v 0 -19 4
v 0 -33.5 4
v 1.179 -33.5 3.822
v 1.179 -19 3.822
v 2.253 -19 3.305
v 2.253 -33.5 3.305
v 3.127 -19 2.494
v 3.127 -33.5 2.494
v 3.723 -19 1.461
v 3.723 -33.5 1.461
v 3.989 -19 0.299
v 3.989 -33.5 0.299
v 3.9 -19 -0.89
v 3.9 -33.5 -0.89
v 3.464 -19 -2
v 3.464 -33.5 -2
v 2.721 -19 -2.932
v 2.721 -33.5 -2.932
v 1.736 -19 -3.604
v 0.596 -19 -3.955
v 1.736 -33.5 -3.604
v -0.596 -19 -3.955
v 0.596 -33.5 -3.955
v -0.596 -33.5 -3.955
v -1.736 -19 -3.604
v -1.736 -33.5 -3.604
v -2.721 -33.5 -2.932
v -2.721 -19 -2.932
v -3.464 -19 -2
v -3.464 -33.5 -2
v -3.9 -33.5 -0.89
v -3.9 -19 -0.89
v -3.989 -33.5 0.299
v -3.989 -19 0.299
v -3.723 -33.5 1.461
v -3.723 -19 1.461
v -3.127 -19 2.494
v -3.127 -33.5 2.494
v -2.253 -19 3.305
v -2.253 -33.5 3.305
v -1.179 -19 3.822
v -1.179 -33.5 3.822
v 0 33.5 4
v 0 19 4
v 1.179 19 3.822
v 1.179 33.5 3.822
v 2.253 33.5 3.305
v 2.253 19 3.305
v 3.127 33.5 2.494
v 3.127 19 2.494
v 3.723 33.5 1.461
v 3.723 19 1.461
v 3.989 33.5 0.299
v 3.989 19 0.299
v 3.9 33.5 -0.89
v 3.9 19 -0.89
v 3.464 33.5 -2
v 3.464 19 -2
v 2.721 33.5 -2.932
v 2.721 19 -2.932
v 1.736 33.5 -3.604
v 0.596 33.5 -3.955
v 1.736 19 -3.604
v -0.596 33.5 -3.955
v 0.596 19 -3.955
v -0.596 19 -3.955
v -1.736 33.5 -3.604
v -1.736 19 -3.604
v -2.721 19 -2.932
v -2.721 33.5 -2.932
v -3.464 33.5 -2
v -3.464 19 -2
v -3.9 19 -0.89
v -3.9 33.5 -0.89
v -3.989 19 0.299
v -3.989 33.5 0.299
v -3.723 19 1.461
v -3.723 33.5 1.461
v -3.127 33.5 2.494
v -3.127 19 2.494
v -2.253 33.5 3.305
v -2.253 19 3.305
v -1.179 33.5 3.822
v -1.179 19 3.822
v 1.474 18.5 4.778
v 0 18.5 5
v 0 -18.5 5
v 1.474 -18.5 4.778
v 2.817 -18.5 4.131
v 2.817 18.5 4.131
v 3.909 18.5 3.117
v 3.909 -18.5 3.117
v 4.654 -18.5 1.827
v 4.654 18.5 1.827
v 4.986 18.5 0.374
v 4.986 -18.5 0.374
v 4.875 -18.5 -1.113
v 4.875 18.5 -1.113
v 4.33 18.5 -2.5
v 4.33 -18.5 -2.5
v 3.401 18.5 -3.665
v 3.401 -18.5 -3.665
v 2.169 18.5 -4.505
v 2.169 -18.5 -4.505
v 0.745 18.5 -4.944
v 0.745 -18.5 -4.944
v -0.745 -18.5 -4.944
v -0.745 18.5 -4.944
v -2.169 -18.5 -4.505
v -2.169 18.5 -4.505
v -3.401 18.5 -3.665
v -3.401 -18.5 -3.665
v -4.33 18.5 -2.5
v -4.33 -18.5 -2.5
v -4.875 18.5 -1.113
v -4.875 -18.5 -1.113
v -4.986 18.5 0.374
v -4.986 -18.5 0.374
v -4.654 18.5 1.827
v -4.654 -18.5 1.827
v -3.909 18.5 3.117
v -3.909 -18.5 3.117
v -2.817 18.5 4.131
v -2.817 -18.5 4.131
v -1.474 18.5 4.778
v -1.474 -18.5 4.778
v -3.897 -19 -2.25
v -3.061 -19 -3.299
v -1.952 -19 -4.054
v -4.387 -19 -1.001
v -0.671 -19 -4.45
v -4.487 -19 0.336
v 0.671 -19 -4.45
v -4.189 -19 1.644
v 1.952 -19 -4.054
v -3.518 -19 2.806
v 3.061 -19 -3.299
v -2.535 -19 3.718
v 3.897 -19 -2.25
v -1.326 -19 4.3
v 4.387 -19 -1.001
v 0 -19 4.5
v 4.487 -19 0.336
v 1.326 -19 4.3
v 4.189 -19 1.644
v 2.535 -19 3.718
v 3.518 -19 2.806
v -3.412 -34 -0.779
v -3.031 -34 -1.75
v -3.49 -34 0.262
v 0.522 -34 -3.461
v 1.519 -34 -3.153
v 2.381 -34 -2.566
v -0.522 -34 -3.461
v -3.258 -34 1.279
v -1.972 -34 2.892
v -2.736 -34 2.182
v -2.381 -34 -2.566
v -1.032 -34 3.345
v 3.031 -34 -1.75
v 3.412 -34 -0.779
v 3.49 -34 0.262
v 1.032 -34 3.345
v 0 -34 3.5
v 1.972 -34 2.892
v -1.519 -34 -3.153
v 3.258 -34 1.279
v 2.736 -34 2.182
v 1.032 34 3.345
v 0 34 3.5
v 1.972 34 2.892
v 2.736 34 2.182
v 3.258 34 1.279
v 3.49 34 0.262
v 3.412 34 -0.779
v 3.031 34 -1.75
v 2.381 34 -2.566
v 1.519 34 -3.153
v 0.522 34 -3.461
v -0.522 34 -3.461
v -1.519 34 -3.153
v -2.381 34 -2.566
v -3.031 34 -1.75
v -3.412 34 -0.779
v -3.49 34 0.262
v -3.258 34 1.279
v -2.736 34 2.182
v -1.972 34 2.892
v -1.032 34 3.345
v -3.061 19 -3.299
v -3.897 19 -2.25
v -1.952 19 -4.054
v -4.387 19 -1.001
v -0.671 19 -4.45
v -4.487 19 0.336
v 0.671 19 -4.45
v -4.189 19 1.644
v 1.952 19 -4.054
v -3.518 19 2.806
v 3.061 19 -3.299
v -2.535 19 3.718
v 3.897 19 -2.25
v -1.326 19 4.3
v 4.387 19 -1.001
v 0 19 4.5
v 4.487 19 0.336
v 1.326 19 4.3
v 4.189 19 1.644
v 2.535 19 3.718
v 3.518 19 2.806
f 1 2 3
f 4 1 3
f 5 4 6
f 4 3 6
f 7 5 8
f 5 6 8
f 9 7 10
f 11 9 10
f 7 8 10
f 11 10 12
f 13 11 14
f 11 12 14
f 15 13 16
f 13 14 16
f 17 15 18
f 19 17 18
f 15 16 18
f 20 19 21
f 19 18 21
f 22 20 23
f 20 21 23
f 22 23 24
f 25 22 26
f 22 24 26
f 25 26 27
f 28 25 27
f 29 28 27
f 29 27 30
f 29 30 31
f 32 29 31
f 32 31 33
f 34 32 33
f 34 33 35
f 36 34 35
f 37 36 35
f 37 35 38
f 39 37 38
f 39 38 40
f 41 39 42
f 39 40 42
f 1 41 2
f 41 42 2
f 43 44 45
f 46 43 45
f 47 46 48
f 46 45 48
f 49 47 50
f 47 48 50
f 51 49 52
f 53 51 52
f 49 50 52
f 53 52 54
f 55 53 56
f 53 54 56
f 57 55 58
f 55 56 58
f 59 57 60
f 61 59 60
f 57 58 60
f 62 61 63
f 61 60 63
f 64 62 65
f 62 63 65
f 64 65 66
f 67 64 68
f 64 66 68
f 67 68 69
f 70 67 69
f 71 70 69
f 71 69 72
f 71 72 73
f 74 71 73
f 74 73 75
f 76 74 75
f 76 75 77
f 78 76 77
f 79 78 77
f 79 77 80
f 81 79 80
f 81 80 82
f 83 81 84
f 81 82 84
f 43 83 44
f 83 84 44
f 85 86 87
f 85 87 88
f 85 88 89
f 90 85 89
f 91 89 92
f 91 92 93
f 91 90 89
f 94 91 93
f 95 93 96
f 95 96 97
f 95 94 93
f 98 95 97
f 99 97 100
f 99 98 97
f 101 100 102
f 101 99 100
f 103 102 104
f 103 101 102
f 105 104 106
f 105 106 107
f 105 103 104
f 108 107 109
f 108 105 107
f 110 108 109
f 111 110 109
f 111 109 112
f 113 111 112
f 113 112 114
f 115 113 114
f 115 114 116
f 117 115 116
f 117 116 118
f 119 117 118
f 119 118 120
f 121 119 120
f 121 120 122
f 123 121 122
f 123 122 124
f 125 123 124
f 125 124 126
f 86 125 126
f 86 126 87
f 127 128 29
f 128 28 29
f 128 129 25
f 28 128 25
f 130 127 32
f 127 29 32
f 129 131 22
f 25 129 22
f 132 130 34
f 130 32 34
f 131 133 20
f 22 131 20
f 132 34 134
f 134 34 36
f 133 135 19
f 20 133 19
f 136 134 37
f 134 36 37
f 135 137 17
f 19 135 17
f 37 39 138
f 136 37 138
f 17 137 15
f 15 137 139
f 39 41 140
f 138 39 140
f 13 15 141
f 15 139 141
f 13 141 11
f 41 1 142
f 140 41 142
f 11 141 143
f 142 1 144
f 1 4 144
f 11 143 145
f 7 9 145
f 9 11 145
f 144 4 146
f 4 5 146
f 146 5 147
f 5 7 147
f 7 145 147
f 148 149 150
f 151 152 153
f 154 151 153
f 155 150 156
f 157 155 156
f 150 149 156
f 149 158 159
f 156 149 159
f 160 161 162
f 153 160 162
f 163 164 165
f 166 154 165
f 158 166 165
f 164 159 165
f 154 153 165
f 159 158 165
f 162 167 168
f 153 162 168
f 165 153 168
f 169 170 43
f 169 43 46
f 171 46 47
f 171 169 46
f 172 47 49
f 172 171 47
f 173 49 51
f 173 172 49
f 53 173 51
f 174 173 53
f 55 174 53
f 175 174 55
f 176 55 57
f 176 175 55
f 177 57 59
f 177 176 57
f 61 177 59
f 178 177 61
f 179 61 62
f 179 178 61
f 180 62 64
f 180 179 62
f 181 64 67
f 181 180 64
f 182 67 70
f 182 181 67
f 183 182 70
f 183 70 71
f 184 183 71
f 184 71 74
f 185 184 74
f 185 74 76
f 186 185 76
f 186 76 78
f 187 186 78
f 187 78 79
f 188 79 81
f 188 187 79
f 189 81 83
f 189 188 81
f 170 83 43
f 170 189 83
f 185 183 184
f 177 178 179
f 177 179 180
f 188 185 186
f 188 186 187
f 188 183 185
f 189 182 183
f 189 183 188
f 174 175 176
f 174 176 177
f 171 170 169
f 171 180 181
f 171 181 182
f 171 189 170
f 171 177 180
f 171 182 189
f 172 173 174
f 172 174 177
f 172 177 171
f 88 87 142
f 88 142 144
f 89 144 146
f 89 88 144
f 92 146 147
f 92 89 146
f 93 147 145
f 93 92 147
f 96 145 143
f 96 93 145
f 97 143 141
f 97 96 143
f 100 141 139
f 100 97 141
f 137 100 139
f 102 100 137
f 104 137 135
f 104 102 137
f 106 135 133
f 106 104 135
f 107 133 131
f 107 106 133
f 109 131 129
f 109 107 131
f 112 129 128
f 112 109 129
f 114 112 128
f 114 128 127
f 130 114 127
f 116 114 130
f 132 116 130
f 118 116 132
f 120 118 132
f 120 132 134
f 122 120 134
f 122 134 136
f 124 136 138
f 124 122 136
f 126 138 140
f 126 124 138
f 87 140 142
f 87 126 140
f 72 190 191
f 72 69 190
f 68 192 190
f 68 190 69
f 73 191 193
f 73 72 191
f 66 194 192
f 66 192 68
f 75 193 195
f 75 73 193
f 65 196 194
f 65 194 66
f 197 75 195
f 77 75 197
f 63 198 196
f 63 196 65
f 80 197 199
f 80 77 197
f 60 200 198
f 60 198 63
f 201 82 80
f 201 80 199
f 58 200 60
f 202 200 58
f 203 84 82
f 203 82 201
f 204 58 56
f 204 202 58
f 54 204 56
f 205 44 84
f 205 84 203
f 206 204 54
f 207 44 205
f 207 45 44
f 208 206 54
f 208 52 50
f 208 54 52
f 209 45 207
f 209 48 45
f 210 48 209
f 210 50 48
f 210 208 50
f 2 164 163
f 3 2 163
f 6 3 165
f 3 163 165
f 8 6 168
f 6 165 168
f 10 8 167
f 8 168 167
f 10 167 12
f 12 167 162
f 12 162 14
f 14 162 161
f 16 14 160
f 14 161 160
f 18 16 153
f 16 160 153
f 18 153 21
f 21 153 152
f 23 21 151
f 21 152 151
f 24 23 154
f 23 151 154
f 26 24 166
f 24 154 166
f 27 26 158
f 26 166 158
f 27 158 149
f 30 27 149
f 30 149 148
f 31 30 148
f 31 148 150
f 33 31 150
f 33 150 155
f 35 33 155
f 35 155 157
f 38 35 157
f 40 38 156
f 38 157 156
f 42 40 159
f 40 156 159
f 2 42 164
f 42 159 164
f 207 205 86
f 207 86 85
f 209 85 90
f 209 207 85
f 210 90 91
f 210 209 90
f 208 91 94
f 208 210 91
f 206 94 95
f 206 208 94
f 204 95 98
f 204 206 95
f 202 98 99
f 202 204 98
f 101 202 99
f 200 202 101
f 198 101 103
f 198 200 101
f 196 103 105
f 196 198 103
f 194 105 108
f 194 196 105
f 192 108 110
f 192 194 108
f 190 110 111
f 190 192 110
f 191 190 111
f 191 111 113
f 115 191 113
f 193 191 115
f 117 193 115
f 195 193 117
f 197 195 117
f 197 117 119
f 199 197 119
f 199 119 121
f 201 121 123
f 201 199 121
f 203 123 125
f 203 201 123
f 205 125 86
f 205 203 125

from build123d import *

# Parameters (mm, degrees)
SKETCH1_R           = 5
BOSS_EXTRUDE1_DEPTH = 19
SKETCH2_R           = 4
BOSS_EXTRUDE2_DEPTH = 15
BOSS_EXTRUDE3_START = -53
SKETCH2_2_R         = 4
BOSS_EXTRUDE3_DEPTH = 15
CHAMFER1_SIZE       = 0.5
CHAMFER2_SIZE       = 0.5


with BuildPart() as part:
    # Sketch1 → Boss-Extrude1 (new, symmetric)
    with BuildSketch(Plane(origin=(0, 0, 0), x_dir=(1, 0, 0), z_dir=(0, 1, 0))):
        with Locations(Location((0, 0, 0), (0, 0, 270))):
            Circle(SKETCH1_R)
    extrude(amount=BOSS_EXTRUDE1_DEPTH, both=True)

    # Sketch2 → Boss-Extrude2 (add)
    with BuildSketch(Plane(origin=(0, 19, 0), x_dir=(1, 0, 0), z_dir=(0, 1, 0))):
        with Locations(Location((0, 0, 0), (0, 0, 270))):
            Circle(SKETCH2_R)
    extrude(amount=BOSS_EXTRUDE2_DEPTH)

    # Sketch2<2> → Boss-Extrude3 (add)
    with BuildSketch(Plane(origin=(0, 19, 0), x_dir=(1, 0, 0), z_dir=(0, 1, 0)).offset(BOSS_EXTRUDE3_START)):
        with Locations(Location((0, 0, 0), (0, 0, 270))):
            Circle(SKETCH2_2_R)
    extrude(amount=BOSS_EXTRUDE3_DEPTH)

    # Chamfer1
    chamfer1_edges = [part.edges().sort_by_distance(p)[0] for p in [
        (0, -34, -4),
        (0, 34, -4),
    ]]
    chamfer(chamfer1_edges, length=CHAMFER1_SIZE)

    # Chamfer2
    chamfer2_edges = [part.edges().sort_by_distance(p)[0] for p in [
        (0, -19, -5),
        (0, 19, -5),
    ]]
    chamfer(chamfer2_edges, length=CHAMFER2_SIZE)


solid = part.part
